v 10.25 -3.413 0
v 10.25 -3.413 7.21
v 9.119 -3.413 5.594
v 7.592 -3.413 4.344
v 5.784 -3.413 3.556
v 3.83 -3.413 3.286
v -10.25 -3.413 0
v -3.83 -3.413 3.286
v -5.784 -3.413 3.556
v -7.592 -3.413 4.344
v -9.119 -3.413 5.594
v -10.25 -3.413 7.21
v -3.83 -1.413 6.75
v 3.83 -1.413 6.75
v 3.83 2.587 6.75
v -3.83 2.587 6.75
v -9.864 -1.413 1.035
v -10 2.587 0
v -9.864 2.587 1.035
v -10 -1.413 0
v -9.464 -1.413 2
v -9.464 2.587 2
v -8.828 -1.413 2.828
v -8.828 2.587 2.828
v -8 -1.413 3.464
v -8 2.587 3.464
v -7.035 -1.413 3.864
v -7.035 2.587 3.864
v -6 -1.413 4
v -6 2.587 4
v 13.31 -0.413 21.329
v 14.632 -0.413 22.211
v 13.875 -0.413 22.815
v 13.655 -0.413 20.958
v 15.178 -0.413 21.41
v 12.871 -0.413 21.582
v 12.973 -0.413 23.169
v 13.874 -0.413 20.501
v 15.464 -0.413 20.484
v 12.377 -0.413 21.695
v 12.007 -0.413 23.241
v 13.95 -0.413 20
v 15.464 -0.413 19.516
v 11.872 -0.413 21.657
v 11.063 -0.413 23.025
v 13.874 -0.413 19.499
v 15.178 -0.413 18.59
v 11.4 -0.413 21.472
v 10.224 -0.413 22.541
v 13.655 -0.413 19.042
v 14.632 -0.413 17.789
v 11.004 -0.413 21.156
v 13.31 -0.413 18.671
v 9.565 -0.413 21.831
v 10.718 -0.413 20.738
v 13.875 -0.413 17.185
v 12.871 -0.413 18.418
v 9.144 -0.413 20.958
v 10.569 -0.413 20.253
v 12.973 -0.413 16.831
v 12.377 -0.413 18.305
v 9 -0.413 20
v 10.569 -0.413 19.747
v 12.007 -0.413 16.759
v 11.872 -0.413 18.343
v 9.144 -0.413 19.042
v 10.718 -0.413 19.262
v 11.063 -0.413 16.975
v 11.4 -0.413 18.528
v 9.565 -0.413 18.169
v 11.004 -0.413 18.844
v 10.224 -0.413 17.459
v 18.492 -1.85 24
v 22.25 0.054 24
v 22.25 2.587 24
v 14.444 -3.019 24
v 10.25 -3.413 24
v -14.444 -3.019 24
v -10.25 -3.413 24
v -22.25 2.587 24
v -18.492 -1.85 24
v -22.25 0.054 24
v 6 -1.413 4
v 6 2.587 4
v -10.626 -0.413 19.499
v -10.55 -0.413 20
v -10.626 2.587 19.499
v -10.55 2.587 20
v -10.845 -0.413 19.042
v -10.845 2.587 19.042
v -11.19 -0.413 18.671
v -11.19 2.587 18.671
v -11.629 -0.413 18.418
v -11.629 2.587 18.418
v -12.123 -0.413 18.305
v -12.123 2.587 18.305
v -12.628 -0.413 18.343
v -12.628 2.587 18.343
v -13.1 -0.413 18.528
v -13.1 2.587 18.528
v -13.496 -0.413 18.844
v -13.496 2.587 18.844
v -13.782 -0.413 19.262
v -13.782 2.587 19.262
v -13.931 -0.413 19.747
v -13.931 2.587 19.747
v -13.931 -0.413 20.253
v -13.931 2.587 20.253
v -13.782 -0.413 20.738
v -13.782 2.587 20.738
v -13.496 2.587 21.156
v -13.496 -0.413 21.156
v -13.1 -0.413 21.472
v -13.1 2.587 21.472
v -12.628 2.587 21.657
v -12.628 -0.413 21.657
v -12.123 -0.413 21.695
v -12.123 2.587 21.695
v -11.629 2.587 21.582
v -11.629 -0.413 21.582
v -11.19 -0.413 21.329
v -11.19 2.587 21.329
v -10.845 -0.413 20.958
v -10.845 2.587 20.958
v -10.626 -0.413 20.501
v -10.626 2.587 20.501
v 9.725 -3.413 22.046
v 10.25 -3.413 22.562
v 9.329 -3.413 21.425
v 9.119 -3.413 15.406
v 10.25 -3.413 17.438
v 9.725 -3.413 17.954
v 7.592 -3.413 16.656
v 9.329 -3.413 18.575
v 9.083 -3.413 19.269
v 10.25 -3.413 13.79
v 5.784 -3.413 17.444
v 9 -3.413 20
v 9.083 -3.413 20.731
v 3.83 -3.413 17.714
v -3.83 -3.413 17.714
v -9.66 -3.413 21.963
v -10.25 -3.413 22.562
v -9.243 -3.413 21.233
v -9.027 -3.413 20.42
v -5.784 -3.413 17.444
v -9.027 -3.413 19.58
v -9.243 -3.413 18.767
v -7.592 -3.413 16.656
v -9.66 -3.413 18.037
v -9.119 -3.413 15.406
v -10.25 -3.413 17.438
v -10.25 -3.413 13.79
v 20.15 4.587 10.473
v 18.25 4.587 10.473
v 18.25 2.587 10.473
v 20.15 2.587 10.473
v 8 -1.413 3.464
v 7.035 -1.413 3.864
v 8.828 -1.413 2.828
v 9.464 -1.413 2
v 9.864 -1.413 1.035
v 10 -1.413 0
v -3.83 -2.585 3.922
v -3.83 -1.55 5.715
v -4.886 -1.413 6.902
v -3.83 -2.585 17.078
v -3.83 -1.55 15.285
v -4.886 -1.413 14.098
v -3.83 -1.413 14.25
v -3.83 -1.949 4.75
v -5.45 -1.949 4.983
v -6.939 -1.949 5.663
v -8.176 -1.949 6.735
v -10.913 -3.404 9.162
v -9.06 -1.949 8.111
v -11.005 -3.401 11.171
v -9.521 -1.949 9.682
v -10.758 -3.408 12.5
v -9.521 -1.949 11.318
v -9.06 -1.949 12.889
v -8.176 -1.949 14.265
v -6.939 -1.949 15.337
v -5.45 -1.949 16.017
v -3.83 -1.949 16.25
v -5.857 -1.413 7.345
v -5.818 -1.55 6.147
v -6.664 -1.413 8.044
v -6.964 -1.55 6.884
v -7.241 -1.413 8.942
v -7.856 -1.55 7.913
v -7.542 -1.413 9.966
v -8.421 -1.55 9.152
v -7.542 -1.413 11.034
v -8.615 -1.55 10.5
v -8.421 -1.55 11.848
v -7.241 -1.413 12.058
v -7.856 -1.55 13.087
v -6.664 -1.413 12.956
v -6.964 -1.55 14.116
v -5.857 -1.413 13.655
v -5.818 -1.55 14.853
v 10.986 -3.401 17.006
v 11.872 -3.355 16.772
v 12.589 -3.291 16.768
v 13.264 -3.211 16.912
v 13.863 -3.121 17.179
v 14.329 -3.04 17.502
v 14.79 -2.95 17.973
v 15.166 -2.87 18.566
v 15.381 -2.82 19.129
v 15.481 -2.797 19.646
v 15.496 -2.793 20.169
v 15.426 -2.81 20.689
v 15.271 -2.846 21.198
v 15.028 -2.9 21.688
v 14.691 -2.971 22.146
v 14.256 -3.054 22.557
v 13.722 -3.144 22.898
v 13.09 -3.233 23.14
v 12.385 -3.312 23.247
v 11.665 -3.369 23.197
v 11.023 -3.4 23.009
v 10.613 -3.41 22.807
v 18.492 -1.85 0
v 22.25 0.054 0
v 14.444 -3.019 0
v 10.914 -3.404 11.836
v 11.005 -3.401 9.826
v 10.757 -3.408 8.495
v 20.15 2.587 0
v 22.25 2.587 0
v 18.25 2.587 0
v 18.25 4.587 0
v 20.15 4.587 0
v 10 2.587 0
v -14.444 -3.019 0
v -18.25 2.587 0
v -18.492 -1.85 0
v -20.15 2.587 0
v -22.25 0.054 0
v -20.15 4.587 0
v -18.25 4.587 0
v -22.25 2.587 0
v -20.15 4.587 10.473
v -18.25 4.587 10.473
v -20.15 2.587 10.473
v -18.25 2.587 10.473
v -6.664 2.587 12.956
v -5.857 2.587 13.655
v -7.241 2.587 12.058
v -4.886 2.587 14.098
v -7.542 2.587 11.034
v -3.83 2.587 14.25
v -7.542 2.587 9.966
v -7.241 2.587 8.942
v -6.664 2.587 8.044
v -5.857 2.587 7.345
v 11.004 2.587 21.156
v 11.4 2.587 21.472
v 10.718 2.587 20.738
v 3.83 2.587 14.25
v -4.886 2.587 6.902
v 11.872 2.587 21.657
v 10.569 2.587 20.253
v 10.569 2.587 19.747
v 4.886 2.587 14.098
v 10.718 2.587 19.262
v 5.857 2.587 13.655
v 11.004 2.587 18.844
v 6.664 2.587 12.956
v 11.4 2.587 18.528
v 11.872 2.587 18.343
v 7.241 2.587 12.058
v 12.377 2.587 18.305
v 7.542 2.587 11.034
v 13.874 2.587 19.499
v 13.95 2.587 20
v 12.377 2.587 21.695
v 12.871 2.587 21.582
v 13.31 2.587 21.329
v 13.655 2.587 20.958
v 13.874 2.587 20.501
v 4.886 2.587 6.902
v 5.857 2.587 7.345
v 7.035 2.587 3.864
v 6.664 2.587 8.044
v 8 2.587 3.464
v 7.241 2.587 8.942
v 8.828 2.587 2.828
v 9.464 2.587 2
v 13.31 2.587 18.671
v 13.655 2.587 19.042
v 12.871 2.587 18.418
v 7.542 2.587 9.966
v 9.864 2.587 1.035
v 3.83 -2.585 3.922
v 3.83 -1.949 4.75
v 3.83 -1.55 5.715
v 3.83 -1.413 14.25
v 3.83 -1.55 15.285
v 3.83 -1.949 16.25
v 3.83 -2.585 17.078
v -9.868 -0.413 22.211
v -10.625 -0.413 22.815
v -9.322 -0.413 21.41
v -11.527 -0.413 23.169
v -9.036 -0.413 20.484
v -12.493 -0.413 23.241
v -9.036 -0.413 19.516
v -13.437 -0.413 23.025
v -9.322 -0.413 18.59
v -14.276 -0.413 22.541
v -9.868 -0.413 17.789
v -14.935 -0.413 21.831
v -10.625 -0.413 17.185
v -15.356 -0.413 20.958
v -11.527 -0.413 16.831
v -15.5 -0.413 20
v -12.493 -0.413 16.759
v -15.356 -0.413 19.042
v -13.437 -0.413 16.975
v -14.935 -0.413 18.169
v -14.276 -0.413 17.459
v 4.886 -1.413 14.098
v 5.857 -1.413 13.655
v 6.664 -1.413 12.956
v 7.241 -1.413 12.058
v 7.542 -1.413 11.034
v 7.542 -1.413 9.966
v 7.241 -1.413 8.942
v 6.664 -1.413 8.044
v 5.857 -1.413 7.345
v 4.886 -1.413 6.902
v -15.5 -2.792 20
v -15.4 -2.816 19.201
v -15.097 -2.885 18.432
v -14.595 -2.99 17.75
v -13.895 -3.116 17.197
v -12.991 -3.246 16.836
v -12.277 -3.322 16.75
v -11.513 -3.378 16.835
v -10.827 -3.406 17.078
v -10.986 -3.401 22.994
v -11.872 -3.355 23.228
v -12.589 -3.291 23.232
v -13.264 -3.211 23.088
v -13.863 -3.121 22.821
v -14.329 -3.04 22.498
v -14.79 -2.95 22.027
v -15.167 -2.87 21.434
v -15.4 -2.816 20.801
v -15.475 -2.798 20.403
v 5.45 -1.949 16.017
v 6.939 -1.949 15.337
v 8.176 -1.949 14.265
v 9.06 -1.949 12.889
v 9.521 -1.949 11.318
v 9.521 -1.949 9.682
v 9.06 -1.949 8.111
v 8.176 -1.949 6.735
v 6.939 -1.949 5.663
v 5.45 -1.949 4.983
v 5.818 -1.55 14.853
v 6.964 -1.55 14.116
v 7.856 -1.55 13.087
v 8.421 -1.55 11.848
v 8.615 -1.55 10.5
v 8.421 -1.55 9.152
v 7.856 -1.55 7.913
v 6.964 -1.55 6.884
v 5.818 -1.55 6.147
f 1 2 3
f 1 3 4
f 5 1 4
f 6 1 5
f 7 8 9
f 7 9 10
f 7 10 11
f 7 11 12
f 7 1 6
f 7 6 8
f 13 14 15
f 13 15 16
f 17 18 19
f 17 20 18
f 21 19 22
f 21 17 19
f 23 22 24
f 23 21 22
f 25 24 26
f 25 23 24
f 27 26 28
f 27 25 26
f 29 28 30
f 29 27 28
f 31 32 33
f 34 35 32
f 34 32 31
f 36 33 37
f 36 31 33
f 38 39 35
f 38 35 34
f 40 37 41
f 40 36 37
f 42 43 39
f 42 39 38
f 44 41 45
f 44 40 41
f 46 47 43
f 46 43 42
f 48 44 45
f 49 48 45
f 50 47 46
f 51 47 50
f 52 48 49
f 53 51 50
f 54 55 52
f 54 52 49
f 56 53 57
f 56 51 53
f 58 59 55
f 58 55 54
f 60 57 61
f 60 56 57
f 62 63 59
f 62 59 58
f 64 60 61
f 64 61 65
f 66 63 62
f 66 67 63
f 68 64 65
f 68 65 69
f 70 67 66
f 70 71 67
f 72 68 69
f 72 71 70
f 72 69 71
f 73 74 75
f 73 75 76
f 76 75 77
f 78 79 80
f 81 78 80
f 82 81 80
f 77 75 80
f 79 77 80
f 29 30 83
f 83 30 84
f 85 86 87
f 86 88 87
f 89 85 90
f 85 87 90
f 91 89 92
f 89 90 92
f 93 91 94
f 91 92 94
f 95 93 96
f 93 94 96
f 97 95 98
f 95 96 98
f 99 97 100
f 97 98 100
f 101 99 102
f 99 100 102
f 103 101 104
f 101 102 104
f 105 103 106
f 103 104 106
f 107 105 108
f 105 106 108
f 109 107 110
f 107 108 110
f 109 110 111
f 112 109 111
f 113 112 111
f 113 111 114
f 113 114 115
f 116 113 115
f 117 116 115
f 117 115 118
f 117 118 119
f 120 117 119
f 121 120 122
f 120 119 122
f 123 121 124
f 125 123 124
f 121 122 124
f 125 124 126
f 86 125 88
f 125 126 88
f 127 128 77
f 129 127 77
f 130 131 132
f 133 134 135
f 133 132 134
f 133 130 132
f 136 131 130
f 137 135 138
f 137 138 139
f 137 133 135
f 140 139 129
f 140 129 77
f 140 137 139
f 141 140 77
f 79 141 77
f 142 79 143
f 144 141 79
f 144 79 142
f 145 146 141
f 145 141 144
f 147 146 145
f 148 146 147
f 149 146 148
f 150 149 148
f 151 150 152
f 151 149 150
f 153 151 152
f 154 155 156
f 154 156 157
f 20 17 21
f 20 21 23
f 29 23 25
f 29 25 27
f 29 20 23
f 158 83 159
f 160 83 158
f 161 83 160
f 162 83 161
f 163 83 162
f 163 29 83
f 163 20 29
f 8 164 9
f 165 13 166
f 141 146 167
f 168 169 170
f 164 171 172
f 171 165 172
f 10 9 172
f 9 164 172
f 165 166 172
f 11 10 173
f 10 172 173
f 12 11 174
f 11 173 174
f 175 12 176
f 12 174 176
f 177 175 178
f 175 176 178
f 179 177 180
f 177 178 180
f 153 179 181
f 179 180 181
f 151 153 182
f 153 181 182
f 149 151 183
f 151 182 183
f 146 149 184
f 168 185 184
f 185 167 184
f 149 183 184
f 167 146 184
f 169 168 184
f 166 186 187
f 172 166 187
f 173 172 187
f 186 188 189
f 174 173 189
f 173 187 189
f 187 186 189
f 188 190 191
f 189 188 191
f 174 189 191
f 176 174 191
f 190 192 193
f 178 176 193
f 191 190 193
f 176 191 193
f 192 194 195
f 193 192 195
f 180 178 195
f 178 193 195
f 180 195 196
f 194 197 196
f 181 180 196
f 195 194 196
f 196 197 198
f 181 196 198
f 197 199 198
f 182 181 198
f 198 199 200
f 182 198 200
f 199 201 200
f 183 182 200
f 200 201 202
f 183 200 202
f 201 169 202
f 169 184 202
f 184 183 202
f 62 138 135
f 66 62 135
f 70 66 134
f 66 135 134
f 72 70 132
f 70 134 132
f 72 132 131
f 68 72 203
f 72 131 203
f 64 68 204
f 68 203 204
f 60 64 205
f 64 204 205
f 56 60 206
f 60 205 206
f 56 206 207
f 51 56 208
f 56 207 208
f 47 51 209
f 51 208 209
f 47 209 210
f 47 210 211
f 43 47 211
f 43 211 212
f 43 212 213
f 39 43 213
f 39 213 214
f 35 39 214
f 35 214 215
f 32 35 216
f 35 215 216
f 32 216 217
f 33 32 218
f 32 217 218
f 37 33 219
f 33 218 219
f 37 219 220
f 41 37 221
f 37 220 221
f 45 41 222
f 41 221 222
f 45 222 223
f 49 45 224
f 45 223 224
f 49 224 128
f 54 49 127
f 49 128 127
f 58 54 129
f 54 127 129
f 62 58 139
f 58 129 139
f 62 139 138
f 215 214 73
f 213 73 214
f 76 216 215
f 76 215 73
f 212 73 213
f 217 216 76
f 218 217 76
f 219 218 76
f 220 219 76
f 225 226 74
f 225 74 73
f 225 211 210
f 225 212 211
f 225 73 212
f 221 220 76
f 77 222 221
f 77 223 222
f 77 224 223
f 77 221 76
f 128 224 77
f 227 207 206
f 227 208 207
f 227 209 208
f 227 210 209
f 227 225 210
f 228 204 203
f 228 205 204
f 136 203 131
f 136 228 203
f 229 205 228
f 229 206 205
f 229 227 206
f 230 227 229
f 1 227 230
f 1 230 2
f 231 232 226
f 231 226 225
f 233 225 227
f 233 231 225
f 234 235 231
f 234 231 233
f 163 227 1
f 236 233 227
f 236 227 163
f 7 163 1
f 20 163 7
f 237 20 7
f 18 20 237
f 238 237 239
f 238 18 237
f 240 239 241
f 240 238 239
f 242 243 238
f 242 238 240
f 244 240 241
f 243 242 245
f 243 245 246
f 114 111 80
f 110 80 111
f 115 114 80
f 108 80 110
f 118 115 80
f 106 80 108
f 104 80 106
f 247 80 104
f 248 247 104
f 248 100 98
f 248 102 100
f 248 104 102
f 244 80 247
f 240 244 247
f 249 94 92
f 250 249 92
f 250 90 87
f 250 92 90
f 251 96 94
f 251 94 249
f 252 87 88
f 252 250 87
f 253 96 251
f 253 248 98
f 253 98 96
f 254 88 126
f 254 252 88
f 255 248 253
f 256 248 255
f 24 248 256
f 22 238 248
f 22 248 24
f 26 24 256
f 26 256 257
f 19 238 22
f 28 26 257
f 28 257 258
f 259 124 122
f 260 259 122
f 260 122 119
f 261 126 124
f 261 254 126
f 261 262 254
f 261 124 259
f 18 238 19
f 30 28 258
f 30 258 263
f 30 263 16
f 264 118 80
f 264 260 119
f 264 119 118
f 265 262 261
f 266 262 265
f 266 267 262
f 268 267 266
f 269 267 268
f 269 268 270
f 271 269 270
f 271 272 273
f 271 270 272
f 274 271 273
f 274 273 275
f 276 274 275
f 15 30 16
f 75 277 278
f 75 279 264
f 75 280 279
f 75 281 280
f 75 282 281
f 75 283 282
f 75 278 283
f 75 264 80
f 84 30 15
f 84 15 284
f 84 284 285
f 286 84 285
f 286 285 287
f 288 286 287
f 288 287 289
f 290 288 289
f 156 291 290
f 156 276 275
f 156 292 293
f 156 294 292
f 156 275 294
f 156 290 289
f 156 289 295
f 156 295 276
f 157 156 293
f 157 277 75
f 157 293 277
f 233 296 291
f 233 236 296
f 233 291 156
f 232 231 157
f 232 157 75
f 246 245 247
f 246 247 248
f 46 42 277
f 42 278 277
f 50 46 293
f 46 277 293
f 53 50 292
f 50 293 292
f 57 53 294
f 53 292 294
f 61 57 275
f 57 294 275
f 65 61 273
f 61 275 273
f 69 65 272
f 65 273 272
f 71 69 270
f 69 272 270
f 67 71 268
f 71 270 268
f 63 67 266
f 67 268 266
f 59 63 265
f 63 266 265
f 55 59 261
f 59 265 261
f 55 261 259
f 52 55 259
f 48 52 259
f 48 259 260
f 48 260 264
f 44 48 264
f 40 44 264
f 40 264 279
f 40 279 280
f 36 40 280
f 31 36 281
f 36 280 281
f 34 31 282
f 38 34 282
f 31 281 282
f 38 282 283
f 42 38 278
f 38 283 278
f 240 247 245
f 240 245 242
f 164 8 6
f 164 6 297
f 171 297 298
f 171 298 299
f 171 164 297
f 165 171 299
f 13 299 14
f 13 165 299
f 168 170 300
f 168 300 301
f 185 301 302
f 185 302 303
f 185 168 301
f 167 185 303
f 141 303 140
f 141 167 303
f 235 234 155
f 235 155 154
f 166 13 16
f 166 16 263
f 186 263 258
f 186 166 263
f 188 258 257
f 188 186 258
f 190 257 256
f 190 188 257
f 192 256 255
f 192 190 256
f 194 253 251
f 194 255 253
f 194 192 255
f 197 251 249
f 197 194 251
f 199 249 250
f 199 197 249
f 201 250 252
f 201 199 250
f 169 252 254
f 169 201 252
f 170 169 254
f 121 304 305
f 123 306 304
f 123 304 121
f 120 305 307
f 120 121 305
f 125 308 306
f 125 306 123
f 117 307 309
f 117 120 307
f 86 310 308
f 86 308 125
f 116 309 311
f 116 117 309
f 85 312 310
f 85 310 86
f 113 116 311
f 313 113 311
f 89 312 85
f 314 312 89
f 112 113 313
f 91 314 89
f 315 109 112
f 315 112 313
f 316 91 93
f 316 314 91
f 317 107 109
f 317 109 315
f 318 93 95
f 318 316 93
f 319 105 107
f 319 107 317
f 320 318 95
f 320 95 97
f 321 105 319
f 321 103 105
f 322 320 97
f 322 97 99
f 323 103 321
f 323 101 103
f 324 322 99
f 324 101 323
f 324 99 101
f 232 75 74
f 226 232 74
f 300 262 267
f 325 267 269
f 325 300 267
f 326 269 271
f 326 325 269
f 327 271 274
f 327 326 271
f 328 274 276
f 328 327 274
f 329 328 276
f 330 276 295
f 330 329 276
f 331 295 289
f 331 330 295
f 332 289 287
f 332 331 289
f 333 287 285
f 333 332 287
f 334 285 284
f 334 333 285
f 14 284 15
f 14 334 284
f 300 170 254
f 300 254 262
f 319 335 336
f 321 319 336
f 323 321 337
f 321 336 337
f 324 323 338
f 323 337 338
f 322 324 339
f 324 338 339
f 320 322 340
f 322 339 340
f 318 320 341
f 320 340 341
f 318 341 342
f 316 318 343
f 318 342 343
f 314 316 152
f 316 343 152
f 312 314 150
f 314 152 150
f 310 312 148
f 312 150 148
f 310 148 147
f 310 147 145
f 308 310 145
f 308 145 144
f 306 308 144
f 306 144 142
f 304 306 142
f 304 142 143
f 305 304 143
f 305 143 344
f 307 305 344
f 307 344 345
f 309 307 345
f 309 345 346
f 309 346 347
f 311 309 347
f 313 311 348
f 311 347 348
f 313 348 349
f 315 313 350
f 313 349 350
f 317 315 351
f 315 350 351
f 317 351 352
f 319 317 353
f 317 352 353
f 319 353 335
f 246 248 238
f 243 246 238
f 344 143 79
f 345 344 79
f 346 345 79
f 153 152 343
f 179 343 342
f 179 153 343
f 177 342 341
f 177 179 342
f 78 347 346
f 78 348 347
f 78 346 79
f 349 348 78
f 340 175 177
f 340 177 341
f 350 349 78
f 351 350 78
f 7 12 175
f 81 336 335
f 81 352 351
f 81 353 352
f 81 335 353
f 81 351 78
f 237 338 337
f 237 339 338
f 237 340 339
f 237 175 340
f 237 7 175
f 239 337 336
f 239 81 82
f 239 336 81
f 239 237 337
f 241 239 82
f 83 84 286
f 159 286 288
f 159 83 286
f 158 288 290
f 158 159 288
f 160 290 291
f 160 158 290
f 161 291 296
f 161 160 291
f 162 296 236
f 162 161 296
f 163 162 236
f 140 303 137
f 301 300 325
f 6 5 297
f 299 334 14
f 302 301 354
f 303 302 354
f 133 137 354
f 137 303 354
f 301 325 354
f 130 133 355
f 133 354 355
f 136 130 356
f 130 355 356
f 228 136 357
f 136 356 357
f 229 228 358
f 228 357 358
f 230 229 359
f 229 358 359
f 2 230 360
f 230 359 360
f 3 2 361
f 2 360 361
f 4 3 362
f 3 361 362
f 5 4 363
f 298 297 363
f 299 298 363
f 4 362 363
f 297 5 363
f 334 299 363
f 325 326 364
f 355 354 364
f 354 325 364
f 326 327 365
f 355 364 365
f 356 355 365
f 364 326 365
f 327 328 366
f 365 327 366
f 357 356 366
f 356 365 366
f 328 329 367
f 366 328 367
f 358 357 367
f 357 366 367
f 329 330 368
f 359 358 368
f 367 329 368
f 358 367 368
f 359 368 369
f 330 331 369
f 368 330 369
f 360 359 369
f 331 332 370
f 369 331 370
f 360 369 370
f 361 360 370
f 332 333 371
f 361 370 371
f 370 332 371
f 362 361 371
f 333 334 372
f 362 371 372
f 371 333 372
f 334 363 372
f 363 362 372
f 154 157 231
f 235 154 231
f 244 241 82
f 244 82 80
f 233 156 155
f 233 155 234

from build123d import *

# Parameters (mm, degrees)
EXTRUDE_1_DEPTH             = 24
SKETCH_2_W                  = 20
SKETCH_2_H                  = 4
CUT_EXTRUDE_1_DEPTH         = 4
SKETCH_3_W                  = 1.9
SKETCH_3_H                  = 10.472908188
EXTRUDE_2_DEPTH             = 2
FILLET_1_R                  = 4
CUT_EXTRUDE_2_DEPTH         = 34.690688625
SWEEP_START                 = -3.83
SWEEP_4_3_DEPTH             = 7.66
HOLE_WIZARD_M31_D           = 3.4
HOLE_WIZARD_M31_CBORE_D     = 6.5
HOLE_WIZARD_M31_CBORE_DEPTH = 3


with BuildPart() as part:
    # Эскиз1 → Бобышка-Вытянуть1 (new body)
    with BuildSketch(Plane.XY):
        with BuildLine():
            Line((-20.25, 2.586649223), (20.25, 2.586649223))
            Line((20.25, 2.586649223), (22.25, 2.586649223))
            Line((22.25, 2.586649223), (22.25, 0.053782912))
            ThreePointArc((22.25, 0.053782912), (16.495418641, -2.529195567), (10.25, -3.413350777))
            Line((10.25, -3.413350777), (-10.25, -3.413350777))
            ThreePointArc((-10.25, -3.413350777), (-16.495418641, -2.529195567), (-22.25, 0.053782912))
            Line((-22.25, 0.053782912), (-22.25, 2.586649223))
            Line((-22.25, 2.586649223), (-20.25, 2.586649223))
        make_face()
    extrude(amount=EXTRUDE_1_DEPTH)

    # Эскиз2 → Вырез-Вытянуть1 (cut)
    with BuildSketch(Plane(origin=(0, 2.586649223, 0), x_dir=(1, 0, 0), z_dir=(0, 1, 0))):
        with Locations((0, -2)):
            Rectangle(SKETCH_2_W, SKETCH_2_H)
    extrude(amount=-CUT_EXTRUDE_1_DEPTH, mode=Mode.SUBTRACT)

    # Эскиз3 → Бобышка-Вытянуть2 (add)
    with BuildSketch(Plane(origin=(0, 2.586649223, 0), x_dir=(1, 0, 0), z_dir=(0, 1, 0))):
        with Locations((19.2, -5.236454094)):
            Rectangle(SKETCH_3_W, SKETCH_3_H)
        with Locations((-19.2, -5.236454094)):
            Rectangle(SKETCH_3_W, SKETCH_3_H)
    extrude(amount=EXTRUDE_2_DEPTH)

    # Скругление1
    fillet_1_edges = [part.edges().sort_by_distance(p)[0] for p in [
        (-10, 0.586649223, 4),
        (10, 0.586649223, 4),
    ]]
    fillet(fillet_1_edges, radius=FILLET_1_R - 0.0001)  # a hair under: the kernel refuses the full size

    # Эскиз4 → Вырез-Вытянуть2 (cut, through all)
    with BuildSketch(Plane.XZ.offset(3.413350777)):
        with BuildLine():
            Line((-3.83, 14.25), (3.83, 14.25))
            ThreePointArc((3.83, 14.25), (7.58, 10.5), (3.83, 6.75))
            Line((3.83, 6.75), (-3.83, 6.75))
            ThreePointArc((-3.83, 6.75), (-7.58, 10.5), (-3.83, 14.25))
        make_face()
    extrude(amount=-CUT_EXTRUDE_2_DEPTH, mode=Mode.SUBTRACT)

    # Вырез-По траектории4: read off the stored shape, not the designer's step
    # Вырез-По траектории4 outline → Вырез-По траектории4 (revolve, cut)
    with BuildSketch(Plane(origin=(3.83, 0, 10.5), x_dir=(1, 0, 0), z_dir=(0, 0, 1))):
        with BuildLine():
            Line((3.75, -3.413351016), (7.214101753, -3.413351016))
            ThreePointArc((7.214101753, -3.413351016), (5.750000119, -1.949249231), (3.75, -1.413350777))
            Line((3.75, -1.413350777), (3.75, -3.413351016))
        make_face()
    revolve(axis=Axis((3.83, 0, 10.5), (0, 1, 0)), mode=Mode.SUBTRACT)

    # Sweep 4 2 outline → Sweep 4 2 (revolve, cut)
    with BuildSketch(Plane(origin=(-3.83, 0, 10.5), x_dir=(1, 0, 0), z_dir=(0, 0, 1))):
        with BuildLine():
            Line((3.75, -3.413350777), (7.214101615, -3.413350777))
            ThreePointArc((7.214101615, -3.413350777), (5.75, -1.949249162), (3.75, -1.413350777))
            Line((3.75, -1.413350777), (3.75, -3.413350777))
        make_face()
    revolve(axis=Axis((-3.83, 0, 10.5), (0, 1, 0)), mode=Mode.SUBTRACT)

    # Sweep 4 3 outline → Sweep 4 3 (cut)
    with BuildSketch(Plane.YZ.offset(SWEEP_START)):
        with BuildLine():
            ThreePointArc((-1.413350777, 14.25), (-1.949249162, 16.25), (-3.413350777, 17.714101615))
            Line((-3.413350777, 17.714101615), (-3.413350777, 3.285898385))
            ThreePointArc((-3.413350777, 3.285898385), (-1.949249162, 4.75), (-1.413350777, 6.75))
            Line((-1.413350777, 6.75), (-1.413350777, 14.25))
        make_face()
    extrude(amount=SWEEP_4_3_DEPTH, mode=Mode.SUBTRACT)

    # Цековка для винта с внутренним шестигранником M31 (through all)
    with Locations(Plane(origin=(-12.25, -3.413350777, 20), x_dir=(-1, 0, 0), z_dir=(0, -1, 0))):
        with Locations((0, 0), (-24.5, 0)):
            CounterBoreHole(HOLE_WIZARD_M31_D / 2, HOLE_WIZARD_M31_CBORE_D / 2, HOLE_WIZARD_M31_CBORE_DEPTH)


solid = part.part
